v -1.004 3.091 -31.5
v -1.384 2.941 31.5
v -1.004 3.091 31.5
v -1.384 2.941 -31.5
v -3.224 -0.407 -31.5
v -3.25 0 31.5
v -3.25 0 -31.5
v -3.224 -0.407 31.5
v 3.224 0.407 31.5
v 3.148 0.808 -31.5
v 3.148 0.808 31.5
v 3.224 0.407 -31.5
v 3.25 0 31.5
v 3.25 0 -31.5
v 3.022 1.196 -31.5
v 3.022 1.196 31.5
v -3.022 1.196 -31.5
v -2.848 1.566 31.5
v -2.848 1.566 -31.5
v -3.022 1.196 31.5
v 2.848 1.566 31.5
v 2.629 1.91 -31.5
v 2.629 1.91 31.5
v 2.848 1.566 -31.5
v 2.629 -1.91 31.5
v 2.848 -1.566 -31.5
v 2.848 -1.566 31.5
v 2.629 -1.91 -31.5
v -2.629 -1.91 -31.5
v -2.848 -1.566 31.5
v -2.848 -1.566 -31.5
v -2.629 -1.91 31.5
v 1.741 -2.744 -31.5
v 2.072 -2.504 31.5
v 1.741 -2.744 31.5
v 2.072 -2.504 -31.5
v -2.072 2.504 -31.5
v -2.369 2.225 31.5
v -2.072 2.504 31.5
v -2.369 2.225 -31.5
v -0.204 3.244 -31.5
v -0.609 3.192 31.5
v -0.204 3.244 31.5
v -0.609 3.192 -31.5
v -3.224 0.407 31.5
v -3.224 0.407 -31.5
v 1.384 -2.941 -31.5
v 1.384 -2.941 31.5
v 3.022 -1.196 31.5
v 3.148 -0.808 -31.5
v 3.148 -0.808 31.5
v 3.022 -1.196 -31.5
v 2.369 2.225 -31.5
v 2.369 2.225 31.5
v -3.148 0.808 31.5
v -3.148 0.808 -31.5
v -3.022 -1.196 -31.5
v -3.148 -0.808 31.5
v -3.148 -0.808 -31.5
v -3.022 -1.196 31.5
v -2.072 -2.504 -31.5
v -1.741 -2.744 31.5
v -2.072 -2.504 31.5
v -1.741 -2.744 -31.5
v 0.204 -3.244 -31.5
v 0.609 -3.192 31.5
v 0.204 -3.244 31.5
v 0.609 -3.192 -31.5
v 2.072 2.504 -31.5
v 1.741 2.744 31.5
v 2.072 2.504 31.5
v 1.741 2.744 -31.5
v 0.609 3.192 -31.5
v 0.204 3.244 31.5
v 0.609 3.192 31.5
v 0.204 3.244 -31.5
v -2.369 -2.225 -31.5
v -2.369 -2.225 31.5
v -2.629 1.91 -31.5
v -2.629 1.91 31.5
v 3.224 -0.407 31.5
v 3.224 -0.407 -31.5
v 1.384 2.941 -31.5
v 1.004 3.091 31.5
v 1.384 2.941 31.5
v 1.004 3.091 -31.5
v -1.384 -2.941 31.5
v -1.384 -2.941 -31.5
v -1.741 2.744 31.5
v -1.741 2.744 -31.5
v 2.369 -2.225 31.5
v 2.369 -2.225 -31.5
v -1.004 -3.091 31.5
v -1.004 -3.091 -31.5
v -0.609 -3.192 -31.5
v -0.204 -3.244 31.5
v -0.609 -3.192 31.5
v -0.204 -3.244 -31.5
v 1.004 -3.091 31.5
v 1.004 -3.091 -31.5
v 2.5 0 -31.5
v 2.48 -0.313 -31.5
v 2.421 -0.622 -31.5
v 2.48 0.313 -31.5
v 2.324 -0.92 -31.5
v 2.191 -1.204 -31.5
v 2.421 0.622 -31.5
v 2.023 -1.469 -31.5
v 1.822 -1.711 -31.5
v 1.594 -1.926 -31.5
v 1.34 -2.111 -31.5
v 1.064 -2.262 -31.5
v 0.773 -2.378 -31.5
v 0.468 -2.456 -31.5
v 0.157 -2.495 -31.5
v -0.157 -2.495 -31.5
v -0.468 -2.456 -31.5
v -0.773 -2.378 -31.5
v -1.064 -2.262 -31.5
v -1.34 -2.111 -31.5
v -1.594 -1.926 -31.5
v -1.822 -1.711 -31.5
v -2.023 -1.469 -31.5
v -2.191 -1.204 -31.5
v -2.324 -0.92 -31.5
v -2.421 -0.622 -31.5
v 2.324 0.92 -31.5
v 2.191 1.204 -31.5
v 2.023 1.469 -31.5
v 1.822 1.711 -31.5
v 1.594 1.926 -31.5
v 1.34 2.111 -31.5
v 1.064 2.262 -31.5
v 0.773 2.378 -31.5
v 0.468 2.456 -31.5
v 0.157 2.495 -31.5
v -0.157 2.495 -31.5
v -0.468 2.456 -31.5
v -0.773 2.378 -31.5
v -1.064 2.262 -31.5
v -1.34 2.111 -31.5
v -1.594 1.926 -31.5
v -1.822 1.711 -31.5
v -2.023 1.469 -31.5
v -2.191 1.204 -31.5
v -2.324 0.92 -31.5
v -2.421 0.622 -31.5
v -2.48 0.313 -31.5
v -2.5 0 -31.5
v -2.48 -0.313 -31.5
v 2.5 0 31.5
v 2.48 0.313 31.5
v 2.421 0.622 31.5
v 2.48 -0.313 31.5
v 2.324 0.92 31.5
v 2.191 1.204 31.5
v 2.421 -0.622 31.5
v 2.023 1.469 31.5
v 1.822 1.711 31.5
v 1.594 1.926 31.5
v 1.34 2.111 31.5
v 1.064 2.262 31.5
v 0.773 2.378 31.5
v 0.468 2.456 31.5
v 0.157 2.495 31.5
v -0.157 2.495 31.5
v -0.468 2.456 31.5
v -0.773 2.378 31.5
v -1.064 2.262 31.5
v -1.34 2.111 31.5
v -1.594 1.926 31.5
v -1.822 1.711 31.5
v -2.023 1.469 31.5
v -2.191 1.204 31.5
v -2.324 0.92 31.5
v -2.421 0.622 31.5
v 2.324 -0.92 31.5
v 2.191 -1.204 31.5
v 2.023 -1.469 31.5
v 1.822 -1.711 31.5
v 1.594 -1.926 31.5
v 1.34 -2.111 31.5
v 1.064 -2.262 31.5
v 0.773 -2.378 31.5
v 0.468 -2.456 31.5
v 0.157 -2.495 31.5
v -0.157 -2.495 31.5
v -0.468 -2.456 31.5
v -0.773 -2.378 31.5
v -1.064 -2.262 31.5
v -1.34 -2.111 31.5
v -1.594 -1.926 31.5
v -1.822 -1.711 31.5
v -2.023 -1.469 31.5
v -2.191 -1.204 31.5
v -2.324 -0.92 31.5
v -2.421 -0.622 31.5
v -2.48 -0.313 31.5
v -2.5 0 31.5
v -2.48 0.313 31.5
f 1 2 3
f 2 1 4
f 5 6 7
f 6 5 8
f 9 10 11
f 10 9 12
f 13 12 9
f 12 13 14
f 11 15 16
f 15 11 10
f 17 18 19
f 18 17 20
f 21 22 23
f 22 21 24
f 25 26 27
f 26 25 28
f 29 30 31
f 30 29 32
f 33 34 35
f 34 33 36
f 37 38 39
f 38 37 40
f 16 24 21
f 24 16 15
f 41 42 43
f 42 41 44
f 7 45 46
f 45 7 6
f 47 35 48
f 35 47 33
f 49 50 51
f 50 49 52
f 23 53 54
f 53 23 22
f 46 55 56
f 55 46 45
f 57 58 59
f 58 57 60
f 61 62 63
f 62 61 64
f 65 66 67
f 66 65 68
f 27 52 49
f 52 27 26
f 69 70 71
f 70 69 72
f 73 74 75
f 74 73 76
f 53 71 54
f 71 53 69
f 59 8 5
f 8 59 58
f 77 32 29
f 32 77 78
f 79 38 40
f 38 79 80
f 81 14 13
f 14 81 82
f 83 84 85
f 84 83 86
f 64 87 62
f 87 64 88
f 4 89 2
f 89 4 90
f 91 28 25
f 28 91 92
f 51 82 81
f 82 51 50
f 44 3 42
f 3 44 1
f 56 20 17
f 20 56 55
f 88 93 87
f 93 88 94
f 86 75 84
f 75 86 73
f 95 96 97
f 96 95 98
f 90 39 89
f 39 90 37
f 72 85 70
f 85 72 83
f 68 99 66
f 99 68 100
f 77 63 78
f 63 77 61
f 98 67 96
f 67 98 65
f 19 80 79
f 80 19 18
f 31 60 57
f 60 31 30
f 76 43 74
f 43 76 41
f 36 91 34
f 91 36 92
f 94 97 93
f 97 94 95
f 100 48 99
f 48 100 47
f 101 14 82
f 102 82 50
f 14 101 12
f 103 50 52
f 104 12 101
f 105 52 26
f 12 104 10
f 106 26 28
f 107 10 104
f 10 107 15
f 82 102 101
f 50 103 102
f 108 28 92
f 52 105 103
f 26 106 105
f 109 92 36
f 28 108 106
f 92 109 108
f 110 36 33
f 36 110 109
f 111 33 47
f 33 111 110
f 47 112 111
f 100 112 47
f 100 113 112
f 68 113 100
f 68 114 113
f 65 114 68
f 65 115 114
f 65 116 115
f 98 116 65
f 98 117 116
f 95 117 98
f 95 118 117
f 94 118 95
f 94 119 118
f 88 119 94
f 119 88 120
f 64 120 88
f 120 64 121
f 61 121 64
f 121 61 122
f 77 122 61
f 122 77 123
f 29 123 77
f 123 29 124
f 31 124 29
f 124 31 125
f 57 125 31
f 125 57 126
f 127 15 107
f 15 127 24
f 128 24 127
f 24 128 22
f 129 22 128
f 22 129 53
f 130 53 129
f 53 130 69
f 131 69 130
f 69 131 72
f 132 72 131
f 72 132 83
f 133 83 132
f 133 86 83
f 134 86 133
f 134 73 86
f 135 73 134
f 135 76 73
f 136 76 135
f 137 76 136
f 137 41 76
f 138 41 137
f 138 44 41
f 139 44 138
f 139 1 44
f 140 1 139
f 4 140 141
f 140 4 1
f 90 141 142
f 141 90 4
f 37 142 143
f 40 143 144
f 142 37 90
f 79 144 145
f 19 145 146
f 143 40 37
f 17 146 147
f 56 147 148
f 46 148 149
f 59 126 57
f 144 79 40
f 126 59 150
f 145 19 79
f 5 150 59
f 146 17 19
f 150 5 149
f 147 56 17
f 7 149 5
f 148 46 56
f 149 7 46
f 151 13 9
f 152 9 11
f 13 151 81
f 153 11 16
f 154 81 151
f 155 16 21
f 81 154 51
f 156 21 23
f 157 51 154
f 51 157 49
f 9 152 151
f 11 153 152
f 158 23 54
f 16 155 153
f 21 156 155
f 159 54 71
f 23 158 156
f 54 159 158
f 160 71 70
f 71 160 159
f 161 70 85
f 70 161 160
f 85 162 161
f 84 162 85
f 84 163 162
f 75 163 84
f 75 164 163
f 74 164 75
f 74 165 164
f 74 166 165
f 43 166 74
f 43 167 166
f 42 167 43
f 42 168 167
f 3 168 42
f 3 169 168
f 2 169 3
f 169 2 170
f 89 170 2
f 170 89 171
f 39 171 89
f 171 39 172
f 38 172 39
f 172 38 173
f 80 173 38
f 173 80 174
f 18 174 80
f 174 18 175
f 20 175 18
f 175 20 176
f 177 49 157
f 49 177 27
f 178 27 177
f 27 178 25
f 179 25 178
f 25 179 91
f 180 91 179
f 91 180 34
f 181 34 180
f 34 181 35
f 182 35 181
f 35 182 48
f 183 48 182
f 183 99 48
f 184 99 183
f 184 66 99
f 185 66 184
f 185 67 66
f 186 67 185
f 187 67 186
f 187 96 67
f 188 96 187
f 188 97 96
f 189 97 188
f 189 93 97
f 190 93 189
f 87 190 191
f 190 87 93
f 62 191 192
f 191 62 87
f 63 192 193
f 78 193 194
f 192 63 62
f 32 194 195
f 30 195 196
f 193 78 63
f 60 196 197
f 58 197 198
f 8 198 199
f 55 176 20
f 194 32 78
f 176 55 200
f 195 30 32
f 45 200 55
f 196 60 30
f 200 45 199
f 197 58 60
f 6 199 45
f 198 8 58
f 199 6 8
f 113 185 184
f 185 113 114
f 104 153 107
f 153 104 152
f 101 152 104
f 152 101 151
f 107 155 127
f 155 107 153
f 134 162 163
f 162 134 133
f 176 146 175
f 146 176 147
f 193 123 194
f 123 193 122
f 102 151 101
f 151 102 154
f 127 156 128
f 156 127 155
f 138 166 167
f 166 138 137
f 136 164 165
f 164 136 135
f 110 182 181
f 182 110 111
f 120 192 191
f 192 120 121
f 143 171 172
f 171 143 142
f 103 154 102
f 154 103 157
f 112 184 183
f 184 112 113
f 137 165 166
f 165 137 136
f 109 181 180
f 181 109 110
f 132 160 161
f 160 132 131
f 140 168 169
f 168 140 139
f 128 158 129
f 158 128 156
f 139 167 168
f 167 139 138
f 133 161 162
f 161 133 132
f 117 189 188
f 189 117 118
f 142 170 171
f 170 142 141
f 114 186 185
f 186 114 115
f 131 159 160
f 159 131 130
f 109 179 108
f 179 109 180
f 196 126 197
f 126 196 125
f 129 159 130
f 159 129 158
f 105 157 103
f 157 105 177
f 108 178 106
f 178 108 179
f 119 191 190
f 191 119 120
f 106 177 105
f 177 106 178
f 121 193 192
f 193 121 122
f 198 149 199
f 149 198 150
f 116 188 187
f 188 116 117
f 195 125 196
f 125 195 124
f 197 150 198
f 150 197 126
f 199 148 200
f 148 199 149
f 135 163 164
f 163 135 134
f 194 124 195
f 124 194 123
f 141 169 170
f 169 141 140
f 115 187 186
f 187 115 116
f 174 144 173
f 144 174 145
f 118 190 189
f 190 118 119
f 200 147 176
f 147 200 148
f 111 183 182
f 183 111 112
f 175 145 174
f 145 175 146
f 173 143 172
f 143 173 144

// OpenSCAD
$fn = 50;


difference() {
	union() {
		translate(v = [0, 0, -31.5000000000]) {
			cylinder(h = 63, r = 3.2500000000);
		}
	}
	union() {
		translate(v = [0, 0, -100.0000000000]) {
			cylinder(h = 200, r = 2.5000000000);
		}
	}
}
